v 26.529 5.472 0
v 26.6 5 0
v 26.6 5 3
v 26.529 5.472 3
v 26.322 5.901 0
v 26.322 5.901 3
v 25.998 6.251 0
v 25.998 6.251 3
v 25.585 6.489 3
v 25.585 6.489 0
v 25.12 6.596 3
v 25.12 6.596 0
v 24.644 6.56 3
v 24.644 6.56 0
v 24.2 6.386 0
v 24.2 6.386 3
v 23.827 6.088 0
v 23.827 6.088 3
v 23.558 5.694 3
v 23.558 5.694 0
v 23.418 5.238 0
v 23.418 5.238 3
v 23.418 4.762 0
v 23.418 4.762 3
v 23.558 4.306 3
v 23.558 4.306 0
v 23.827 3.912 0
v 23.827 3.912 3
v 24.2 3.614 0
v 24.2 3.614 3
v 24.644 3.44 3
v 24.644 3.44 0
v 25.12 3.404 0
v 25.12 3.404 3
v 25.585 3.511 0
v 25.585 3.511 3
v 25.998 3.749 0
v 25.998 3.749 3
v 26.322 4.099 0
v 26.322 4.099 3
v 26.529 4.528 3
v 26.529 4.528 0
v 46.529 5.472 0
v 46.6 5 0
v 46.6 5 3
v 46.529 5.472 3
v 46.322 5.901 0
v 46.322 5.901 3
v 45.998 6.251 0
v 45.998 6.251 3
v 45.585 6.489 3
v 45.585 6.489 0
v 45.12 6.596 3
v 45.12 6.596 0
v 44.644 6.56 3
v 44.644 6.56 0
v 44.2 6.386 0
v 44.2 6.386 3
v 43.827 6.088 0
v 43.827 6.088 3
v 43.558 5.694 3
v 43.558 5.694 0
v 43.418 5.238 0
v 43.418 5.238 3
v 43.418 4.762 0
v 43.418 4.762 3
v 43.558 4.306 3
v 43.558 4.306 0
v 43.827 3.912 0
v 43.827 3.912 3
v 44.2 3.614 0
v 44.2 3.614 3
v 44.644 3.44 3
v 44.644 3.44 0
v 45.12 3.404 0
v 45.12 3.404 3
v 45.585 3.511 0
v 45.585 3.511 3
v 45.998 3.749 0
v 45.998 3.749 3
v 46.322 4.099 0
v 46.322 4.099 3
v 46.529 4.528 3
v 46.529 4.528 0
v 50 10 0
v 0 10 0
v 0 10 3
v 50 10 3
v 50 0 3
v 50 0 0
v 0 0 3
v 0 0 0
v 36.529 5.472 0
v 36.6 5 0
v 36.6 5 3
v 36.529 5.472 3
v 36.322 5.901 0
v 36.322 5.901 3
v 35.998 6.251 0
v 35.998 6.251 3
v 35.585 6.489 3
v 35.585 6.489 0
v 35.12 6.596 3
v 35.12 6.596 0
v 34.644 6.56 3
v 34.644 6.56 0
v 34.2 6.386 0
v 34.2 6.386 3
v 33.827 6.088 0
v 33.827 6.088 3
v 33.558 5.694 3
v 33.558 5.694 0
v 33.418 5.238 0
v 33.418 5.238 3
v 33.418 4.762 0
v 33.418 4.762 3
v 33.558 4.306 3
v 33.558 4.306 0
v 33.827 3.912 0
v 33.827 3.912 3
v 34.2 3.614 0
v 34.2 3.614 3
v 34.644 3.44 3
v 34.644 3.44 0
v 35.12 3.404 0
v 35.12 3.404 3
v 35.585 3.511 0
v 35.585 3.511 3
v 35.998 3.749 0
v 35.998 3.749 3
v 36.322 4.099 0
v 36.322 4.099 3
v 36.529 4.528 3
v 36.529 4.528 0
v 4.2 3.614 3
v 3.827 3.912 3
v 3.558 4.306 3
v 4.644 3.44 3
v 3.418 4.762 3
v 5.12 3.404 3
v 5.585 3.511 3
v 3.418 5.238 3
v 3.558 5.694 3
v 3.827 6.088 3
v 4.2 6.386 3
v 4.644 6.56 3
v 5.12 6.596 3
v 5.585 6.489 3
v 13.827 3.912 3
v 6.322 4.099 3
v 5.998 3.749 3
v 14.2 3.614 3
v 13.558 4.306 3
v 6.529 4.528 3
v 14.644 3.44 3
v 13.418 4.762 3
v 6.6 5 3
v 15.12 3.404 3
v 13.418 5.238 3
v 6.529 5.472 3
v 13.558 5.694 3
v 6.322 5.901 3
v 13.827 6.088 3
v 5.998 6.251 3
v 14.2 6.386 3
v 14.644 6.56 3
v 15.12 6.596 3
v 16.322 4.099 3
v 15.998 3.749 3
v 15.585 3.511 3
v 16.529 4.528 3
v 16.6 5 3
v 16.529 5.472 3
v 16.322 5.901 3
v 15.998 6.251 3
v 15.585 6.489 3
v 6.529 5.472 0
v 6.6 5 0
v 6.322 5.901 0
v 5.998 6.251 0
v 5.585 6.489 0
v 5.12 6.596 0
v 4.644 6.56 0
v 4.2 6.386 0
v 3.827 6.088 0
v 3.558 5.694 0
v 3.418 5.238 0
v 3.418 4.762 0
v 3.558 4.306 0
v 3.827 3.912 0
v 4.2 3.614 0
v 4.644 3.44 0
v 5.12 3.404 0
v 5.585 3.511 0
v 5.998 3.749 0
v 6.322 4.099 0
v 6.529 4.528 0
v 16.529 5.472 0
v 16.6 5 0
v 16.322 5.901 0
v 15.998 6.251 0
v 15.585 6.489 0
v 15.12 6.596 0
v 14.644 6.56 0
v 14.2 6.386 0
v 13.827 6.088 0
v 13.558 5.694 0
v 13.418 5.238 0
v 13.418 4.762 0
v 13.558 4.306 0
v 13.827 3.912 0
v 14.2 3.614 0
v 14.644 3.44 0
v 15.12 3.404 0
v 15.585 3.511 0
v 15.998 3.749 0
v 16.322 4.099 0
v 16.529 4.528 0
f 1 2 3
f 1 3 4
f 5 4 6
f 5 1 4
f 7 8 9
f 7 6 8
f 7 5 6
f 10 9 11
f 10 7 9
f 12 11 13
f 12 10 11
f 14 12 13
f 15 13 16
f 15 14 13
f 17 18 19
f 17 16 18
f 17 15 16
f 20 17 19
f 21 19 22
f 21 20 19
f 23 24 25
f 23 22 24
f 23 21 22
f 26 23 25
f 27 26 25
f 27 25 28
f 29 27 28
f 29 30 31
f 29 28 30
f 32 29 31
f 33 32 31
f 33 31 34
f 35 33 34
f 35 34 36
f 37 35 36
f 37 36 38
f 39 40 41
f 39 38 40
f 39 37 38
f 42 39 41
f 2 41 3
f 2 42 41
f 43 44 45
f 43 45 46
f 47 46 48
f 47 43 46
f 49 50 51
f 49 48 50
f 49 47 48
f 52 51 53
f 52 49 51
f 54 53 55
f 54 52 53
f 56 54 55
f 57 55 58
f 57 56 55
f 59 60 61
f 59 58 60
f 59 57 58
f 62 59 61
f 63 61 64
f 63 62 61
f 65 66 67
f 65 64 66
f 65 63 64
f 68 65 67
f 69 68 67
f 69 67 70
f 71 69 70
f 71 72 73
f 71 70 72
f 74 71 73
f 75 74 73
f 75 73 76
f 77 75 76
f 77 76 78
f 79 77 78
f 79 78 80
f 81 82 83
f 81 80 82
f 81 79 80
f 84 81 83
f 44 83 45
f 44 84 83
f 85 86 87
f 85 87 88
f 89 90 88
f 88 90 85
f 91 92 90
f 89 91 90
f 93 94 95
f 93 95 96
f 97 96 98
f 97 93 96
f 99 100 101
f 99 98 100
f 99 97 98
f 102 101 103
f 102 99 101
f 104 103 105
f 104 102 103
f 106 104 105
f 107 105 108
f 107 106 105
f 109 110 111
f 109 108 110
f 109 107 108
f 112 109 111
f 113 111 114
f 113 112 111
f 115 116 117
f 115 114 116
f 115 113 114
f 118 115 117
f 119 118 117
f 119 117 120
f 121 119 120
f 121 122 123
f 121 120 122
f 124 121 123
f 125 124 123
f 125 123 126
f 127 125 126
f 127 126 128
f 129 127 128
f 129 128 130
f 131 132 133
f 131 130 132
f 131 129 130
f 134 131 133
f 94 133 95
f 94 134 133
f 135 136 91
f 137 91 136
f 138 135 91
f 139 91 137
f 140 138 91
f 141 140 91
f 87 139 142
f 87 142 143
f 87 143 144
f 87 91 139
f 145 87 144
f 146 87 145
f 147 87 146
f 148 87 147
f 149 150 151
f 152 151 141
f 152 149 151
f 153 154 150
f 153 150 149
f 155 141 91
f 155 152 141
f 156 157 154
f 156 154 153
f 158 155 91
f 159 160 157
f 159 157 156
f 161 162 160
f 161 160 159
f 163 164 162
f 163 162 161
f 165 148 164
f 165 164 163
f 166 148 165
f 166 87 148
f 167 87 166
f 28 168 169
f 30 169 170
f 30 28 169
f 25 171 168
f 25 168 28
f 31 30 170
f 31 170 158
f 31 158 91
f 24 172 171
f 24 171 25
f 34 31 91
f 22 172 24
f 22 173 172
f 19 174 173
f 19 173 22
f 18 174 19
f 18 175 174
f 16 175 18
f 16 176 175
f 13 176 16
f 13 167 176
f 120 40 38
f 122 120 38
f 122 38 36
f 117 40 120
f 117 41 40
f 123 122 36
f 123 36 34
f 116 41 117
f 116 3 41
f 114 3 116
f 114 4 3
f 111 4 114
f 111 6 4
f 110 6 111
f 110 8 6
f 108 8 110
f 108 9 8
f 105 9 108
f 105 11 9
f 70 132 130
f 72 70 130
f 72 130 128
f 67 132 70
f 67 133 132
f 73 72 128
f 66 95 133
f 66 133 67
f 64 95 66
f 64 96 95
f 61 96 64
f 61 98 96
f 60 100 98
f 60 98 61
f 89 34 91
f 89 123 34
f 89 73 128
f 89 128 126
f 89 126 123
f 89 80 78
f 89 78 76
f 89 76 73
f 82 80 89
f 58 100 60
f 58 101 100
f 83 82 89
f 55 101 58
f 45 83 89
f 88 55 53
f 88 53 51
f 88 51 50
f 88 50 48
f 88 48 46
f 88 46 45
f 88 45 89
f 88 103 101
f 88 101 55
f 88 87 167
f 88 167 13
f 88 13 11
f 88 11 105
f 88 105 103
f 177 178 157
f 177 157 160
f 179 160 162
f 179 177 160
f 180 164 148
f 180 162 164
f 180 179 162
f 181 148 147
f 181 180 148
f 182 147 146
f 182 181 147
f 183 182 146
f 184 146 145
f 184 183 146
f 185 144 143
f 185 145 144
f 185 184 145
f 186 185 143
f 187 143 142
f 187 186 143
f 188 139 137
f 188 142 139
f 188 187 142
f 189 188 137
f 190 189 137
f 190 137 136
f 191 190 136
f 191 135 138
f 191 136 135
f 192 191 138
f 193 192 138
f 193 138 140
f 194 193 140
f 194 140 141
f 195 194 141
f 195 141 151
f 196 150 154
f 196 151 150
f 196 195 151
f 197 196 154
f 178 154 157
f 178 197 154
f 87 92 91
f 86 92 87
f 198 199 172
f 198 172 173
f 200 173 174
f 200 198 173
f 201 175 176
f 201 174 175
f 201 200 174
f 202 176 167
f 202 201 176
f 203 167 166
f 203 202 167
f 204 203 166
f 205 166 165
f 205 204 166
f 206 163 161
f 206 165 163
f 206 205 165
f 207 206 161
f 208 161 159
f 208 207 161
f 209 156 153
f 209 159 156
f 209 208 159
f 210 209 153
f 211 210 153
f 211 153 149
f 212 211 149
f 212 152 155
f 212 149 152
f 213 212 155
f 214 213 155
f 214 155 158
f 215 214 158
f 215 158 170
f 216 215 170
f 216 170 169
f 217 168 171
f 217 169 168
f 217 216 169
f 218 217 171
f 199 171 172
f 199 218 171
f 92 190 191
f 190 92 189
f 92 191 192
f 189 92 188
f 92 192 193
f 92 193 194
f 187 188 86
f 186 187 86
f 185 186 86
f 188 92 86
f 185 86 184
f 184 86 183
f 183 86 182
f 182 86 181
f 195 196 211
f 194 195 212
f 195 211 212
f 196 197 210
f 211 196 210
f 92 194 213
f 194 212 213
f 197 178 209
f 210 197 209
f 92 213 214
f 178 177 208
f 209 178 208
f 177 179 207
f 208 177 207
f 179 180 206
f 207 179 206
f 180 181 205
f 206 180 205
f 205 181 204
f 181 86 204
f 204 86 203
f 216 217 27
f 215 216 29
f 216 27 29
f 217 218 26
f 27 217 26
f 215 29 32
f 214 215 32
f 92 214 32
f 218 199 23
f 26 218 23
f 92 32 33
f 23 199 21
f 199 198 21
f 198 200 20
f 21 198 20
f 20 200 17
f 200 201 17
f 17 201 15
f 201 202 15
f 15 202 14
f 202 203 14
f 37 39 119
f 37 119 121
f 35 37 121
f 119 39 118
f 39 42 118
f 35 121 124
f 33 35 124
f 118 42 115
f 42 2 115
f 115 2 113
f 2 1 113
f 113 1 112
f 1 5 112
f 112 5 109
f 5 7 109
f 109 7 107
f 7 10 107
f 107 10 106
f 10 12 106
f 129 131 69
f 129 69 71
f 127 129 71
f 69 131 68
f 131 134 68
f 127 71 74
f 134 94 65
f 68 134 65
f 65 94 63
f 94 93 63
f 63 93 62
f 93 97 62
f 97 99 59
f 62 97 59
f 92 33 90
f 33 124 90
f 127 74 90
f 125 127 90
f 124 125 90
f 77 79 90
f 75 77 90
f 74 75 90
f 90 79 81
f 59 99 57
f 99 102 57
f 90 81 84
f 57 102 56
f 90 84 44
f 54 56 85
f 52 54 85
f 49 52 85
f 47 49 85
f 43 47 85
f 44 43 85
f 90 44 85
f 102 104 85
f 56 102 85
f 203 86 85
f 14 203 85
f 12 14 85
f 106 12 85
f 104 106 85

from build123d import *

# Parameters (mm, degrees)
CYLINDER001_R     = 1.6
CYLINDER001_DEPTH = 10
CYLINDER_R        = 1.6
CYLINDER_DEPTH    = 10
CYLINDER002_R     = 1.6
CYLINDER002_DEPTH = 10
CYLINDER003_R     = 1.6
CYLINDER003_DEPTH = 10
CYLINDER004_R     = 1.6
CYLINDER004_DEPTH = 10
BOX_W             = 50
BOX_H             = 10
BOX_DEPTH         = 3


with BuildPart() as cylinder001:
    # Cylinder001 → Cylinder001 (new body)
    with BuildSketch(Plane(origin=(15, 5, -3), x_dir=(1, 0, 0), z_dir=(0, 0, 1))):
        Circle(CYLINDER001_R)
    extrude(amount=CYLINDER001_DEPTH)


with BuildPart() as cylinder:
    # Cylinder → Cylinder (new body)
    with BuildSketch(Plane(origin=(5, 5, -3), x_dir=(1, 0, 0), z_dir=(0, 0, 1))):
        Circle(CYLINDER_R)
    extrude(amount=CYLINDER_DEPTH)


with BuildPart() as cylinder002:
    # Cylinder002 → Cylinder002 (new body)
    with BuildSketch(Plane(origin=(25, 5, -3), x_dir=(1, 0, 0), z_dir=(0, 0, 1))):
        Circle(CYLINDER002_R)
    extrude(amount=CYLINDER002_DEPTH)


with BuildPart() as cylinder003:
    # Cylinder003 → Cylinder003 (new body)
    with BuildSketch(Plane(origin=(35, 5, -3), x_dir=(1, 0, 0), z_dir=(0, 0, 1))):
        Circle(CYLINDER003_R)
    extrude(amount=CYLINDER003_DEPTH)


with BuildPart() as fusion:
    # Cylinder004 → Cylinder004 (new body)
    with BuildSketch(Plane(origin=(45, 5, -3), x_dir=(1, 0, 0), z_dir=(0, 0, 1))):
        Circle(CYLINDER004_R)
    extrude(amount=CYLINDER004_DEPTH)

    # Fusion: union Cylinder001, Cylinder, Cylinder002, Cylinder003
    add(cylinder001.part)
    add(cylinder.part)
    add(cylinder002.part)
    add(cylinder003.part)


with BuildPart() as cut:
    # Box → Box (new body)
    with BuildSketch(Plane.XY):
        with Locations((25, 5)):
            Rectangle(BOX_W, BOX_H)
    extrude(amount=BOX_DEPTH)

    # Cut: cut Fusion
    add(fusion.part, mode=Mode.SUBTRACT)


solid = cut.part
